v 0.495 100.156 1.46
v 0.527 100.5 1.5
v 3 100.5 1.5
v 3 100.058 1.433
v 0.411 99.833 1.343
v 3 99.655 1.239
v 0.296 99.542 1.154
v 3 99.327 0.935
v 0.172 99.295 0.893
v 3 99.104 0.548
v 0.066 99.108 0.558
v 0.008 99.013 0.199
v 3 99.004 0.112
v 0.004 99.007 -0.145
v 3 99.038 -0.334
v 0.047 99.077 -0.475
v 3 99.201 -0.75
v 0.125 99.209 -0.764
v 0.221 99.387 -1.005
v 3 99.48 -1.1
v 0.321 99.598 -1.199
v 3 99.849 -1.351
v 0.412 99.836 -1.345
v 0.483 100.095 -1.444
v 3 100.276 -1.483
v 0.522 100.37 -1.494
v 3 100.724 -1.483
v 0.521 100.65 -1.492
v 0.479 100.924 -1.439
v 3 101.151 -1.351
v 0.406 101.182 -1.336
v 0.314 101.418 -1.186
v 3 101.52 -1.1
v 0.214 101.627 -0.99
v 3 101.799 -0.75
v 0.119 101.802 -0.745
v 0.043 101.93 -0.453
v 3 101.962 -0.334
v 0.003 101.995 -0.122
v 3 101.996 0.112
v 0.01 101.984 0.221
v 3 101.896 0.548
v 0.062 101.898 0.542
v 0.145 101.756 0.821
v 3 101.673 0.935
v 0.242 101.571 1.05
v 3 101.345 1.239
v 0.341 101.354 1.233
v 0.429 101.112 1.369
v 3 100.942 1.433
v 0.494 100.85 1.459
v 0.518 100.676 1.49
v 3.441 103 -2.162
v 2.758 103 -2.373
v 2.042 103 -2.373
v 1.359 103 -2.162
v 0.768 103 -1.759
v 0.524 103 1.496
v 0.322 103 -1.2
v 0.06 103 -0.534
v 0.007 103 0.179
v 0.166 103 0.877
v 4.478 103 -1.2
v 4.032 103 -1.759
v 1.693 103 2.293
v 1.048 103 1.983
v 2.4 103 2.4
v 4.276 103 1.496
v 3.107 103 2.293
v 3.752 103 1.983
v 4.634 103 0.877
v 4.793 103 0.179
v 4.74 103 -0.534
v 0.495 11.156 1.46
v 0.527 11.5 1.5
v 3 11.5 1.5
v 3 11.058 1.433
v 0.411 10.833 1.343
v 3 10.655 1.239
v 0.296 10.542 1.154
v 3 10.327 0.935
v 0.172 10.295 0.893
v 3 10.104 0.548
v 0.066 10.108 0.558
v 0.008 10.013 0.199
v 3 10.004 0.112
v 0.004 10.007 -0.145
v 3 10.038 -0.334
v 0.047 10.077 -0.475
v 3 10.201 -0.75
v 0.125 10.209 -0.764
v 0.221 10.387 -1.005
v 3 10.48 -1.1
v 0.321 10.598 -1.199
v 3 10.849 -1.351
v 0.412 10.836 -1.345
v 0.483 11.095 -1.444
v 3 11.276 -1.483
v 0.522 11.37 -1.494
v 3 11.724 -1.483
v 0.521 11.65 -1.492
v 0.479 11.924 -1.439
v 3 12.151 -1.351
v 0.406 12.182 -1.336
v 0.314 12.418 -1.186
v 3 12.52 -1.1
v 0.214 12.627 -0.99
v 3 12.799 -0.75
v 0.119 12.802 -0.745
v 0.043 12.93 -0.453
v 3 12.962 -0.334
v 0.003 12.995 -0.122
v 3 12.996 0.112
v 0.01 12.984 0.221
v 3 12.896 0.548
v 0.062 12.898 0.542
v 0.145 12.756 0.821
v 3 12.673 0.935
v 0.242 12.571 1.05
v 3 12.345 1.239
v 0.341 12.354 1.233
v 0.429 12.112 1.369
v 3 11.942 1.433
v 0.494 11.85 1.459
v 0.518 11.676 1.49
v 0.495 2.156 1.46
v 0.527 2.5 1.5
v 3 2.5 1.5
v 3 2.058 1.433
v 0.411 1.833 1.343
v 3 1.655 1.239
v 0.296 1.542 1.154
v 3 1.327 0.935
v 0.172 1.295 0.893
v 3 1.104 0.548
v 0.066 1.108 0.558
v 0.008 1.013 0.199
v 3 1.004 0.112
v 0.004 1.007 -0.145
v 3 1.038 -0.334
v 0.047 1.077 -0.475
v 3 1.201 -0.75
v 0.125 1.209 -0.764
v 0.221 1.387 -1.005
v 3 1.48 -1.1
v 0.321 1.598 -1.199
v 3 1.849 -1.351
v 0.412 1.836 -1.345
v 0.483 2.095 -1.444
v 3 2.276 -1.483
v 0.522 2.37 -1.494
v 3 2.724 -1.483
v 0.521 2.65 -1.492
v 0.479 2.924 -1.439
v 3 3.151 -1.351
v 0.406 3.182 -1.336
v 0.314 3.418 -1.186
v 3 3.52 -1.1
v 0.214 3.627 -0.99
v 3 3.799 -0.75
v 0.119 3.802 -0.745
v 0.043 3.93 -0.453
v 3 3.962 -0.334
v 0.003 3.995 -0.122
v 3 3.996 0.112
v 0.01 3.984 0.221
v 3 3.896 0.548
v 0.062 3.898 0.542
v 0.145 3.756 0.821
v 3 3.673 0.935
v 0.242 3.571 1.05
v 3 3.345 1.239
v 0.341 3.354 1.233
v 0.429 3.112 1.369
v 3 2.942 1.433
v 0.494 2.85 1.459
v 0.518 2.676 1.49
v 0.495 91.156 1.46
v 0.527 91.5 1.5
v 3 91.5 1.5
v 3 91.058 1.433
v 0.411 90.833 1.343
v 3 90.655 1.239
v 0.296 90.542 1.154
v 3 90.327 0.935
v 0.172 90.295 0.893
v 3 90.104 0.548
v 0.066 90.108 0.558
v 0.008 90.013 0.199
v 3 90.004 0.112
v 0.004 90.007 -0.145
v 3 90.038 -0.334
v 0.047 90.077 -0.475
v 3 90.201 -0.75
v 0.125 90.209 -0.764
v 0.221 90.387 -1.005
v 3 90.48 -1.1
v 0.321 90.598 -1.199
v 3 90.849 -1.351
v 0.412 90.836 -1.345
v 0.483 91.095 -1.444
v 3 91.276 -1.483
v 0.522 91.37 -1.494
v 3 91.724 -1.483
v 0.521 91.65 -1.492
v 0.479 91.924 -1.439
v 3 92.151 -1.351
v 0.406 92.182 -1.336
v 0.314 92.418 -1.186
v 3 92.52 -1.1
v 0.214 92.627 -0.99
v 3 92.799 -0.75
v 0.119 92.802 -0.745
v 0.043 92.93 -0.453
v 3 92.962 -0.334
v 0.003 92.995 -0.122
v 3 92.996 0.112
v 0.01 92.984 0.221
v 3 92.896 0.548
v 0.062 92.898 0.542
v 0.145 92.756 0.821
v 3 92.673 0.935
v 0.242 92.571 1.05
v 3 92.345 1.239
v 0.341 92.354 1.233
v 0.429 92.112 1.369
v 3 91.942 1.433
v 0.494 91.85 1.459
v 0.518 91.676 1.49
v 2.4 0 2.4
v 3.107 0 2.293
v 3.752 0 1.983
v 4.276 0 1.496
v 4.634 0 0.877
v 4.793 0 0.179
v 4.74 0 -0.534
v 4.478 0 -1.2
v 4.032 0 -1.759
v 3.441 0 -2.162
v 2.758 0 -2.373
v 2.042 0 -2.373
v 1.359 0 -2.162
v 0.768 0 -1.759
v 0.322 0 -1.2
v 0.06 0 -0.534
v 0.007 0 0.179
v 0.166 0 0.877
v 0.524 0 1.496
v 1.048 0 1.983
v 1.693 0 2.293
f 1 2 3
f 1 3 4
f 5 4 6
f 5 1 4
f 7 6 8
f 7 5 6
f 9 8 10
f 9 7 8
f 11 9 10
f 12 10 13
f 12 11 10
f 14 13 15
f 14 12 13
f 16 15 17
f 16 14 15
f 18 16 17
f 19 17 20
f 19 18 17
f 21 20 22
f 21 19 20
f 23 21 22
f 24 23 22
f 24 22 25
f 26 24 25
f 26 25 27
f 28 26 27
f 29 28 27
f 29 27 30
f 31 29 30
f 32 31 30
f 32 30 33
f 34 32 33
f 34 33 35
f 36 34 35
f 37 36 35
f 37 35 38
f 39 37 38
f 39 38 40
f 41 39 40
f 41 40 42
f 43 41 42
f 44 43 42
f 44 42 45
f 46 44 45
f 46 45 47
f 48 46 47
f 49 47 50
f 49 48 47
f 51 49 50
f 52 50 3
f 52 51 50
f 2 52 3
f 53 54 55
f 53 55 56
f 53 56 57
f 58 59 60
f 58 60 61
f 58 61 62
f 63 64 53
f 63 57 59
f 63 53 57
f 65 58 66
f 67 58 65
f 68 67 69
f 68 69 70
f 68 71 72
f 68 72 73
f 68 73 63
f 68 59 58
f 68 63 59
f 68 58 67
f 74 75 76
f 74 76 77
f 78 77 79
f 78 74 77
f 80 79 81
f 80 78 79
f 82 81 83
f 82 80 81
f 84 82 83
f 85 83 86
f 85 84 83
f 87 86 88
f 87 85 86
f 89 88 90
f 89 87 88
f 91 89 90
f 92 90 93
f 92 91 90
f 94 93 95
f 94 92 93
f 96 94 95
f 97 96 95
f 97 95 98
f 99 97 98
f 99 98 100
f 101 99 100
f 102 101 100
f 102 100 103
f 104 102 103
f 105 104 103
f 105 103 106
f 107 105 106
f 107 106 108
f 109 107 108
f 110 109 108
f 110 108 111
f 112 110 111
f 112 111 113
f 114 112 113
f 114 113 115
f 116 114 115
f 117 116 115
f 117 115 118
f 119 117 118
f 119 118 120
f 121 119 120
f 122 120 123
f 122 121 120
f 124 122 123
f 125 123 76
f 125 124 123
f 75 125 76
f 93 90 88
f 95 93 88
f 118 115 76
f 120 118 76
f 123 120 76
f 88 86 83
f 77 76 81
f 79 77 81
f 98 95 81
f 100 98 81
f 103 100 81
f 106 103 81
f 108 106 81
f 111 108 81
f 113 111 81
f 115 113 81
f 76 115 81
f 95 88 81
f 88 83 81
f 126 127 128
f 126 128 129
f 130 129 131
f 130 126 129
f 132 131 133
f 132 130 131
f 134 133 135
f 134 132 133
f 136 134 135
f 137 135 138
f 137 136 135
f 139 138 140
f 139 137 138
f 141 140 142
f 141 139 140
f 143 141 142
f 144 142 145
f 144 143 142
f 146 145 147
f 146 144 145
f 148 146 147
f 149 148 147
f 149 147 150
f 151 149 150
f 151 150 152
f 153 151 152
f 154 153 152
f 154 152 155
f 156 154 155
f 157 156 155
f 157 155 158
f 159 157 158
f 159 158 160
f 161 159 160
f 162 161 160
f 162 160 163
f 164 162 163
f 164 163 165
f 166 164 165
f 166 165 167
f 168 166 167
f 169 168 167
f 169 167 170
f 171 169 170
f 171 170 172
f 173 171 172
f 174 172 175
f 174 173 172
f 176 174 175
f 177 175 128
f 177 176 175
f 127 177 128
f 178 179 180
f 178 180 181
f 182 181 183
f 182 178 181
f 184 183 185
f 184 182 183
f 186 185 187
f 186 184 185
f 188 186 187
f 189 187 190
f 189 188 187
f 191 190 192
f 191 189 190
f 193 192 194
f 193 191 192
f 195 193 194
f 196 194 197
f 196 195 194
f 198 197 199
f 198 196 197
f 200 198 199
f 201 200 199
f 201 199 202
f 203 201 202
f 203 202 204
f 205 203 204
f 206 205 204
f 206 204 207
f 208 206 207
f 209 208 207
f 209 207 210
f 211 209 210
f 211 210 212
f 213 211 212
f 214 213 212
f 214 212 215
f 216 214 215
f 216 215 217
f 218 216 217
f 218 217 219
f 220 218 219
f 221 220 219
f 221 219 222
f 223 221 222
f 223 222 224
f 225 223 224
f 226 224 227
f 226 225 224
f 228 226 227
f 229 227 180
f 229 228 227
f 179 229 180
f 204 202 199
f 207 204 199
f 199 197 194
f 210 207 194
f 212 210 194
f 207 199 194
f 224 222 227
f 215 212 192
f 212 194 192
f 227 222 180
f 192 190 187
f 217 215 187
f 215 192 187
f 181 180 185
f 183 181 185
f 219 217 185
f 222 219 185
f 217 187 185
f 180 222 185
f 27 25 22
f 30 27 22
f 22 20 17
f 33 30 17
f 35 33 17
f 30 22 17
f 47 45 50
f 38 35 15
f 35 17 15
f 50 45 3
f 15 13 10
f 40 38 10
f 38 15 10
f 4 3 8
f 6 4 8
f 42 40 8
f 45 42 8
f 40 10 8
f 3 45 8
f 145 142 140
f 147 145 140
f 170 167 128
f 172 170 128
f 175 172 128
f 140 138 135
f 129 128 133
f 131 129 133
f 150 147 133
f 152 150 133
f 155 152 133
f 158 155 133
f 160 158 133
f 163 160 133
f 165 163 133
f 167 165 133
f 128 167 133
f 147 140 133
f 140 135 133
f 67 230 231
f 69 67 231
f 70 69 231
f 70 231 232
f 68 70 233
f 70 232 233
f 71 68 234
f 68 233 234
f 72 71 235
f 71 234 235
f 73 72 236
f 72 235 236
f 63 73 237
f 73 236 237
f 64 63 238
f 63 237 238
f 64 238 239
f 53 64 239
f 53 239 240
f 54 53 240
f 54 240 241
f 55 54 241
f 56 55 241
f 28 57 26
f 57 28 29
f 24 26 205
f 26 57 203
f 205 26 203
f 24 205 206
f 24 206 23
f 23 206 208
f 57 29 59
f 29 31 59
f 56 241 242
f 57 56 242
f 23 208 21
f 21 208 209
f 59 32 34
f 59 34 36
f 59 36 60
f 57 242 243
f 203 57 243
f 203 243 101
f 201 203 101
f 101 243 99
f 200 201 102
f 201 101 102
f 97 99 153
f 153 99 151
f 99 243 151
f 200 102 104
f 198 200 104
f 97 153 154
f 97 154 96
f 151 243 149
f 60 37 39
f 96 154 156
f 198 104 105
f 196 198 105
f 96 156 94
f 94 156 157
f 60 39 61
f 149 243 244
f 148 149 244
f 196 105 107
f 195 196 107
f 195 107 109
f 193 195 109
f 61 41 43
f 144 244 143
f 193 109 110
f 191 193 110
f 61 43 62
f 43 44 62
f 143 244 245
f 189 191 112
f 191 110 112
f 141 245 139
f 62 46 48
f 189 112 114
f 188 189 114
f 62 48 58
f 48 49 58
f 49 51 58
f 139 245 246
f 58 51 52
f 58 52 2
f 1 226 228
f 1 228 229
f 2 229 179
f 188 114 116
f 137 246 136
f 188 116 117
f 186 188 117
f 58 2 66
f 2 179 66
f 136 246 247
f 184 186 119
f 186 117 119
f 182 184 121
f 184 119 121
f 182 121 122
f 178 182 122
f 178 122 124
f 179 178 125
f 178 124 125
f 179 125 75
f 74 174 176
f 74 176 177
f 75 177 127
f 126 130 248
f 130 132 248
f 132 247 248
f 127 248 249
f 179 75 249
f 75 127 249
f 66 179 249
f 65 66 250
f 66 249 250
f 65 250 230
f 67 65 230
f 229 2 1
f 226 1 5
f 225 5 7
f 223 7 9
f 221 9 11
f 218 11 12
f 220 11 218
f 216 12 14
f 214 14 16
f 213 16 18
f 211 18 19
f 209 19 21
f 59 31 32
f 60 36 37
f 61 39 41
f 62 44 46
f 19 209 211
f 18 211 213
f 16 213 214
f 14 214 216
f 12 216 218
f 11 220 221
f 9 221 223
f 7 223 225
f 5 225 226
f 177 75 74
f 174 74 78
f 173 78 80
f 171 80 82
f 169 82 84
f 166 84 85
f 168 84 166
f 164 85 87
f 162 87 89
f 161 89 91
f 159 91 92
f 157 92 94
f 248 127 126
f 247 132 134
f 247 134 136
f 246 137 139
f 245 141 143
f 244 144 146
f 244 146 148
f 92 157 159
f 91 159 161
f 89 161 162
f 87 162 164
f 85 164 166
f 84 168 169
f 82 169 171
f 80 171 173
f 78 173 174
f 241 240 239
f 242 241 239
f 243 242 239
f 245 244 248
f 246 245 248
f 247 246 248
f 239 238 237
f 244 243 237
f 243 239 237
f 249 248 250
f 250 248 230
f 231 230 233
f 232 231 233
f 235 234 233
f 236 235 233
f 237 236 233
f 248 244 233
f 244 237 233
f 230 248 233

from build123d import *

# Parameters (mm, degrees)
SZKIC5_R                    = 2.4
DODANIE_WYCI_GNI_CIE2_DEPTH = 103
SZKIC6_R                    = 1.5
WYTNIJ_WYCI_GNI_CIE1_DEPTH  = 3


with BuildPart() as part:
    # Szkic5 → Dodanie-wyciągnięcie2 (new body)
    with BuildSketch(Plane(origin=(0, 0, 0), x_dir=(1, 0, 0), z_dir=(0, 1, 0))):
        with Locations(Location((2.4, 0, 0), (0, 0, 270))):
            Circle(SZKIC5_R)
    extrude(amount=DODANIE_WYCI_GNI_CIE2_DEPTH)

    # Szkic6 → Wytnij-wyciągnięcie1 (cut)
    with BuildSketch(Plane(origin=(0, 0, 0), x_dir=(0, 0, -1), z_dir=(1, 0, 0))):
        with Locations(Location((0, 2.5, 0), (0, 0, 180))):
            Circle(SZKIC6_R)
        with Locations(Location((0, 11.5, 0), (0, 0, 180))):
            Circle(SZKIC6_R)
        with Locations(Location((0, 91.5, 0), (0, 0, 180))):
            Circle(SZKIC6_R)
        with Locations(Location((0, 100.5, 0), (0, 0, 180))):
            Circle(SZKIC6_R)
    extrude(amount=WYTNIJ_WYCI_GNI_CIE1_DEPTH, mode=Mode.SUBTRACT)


solid = part.part
